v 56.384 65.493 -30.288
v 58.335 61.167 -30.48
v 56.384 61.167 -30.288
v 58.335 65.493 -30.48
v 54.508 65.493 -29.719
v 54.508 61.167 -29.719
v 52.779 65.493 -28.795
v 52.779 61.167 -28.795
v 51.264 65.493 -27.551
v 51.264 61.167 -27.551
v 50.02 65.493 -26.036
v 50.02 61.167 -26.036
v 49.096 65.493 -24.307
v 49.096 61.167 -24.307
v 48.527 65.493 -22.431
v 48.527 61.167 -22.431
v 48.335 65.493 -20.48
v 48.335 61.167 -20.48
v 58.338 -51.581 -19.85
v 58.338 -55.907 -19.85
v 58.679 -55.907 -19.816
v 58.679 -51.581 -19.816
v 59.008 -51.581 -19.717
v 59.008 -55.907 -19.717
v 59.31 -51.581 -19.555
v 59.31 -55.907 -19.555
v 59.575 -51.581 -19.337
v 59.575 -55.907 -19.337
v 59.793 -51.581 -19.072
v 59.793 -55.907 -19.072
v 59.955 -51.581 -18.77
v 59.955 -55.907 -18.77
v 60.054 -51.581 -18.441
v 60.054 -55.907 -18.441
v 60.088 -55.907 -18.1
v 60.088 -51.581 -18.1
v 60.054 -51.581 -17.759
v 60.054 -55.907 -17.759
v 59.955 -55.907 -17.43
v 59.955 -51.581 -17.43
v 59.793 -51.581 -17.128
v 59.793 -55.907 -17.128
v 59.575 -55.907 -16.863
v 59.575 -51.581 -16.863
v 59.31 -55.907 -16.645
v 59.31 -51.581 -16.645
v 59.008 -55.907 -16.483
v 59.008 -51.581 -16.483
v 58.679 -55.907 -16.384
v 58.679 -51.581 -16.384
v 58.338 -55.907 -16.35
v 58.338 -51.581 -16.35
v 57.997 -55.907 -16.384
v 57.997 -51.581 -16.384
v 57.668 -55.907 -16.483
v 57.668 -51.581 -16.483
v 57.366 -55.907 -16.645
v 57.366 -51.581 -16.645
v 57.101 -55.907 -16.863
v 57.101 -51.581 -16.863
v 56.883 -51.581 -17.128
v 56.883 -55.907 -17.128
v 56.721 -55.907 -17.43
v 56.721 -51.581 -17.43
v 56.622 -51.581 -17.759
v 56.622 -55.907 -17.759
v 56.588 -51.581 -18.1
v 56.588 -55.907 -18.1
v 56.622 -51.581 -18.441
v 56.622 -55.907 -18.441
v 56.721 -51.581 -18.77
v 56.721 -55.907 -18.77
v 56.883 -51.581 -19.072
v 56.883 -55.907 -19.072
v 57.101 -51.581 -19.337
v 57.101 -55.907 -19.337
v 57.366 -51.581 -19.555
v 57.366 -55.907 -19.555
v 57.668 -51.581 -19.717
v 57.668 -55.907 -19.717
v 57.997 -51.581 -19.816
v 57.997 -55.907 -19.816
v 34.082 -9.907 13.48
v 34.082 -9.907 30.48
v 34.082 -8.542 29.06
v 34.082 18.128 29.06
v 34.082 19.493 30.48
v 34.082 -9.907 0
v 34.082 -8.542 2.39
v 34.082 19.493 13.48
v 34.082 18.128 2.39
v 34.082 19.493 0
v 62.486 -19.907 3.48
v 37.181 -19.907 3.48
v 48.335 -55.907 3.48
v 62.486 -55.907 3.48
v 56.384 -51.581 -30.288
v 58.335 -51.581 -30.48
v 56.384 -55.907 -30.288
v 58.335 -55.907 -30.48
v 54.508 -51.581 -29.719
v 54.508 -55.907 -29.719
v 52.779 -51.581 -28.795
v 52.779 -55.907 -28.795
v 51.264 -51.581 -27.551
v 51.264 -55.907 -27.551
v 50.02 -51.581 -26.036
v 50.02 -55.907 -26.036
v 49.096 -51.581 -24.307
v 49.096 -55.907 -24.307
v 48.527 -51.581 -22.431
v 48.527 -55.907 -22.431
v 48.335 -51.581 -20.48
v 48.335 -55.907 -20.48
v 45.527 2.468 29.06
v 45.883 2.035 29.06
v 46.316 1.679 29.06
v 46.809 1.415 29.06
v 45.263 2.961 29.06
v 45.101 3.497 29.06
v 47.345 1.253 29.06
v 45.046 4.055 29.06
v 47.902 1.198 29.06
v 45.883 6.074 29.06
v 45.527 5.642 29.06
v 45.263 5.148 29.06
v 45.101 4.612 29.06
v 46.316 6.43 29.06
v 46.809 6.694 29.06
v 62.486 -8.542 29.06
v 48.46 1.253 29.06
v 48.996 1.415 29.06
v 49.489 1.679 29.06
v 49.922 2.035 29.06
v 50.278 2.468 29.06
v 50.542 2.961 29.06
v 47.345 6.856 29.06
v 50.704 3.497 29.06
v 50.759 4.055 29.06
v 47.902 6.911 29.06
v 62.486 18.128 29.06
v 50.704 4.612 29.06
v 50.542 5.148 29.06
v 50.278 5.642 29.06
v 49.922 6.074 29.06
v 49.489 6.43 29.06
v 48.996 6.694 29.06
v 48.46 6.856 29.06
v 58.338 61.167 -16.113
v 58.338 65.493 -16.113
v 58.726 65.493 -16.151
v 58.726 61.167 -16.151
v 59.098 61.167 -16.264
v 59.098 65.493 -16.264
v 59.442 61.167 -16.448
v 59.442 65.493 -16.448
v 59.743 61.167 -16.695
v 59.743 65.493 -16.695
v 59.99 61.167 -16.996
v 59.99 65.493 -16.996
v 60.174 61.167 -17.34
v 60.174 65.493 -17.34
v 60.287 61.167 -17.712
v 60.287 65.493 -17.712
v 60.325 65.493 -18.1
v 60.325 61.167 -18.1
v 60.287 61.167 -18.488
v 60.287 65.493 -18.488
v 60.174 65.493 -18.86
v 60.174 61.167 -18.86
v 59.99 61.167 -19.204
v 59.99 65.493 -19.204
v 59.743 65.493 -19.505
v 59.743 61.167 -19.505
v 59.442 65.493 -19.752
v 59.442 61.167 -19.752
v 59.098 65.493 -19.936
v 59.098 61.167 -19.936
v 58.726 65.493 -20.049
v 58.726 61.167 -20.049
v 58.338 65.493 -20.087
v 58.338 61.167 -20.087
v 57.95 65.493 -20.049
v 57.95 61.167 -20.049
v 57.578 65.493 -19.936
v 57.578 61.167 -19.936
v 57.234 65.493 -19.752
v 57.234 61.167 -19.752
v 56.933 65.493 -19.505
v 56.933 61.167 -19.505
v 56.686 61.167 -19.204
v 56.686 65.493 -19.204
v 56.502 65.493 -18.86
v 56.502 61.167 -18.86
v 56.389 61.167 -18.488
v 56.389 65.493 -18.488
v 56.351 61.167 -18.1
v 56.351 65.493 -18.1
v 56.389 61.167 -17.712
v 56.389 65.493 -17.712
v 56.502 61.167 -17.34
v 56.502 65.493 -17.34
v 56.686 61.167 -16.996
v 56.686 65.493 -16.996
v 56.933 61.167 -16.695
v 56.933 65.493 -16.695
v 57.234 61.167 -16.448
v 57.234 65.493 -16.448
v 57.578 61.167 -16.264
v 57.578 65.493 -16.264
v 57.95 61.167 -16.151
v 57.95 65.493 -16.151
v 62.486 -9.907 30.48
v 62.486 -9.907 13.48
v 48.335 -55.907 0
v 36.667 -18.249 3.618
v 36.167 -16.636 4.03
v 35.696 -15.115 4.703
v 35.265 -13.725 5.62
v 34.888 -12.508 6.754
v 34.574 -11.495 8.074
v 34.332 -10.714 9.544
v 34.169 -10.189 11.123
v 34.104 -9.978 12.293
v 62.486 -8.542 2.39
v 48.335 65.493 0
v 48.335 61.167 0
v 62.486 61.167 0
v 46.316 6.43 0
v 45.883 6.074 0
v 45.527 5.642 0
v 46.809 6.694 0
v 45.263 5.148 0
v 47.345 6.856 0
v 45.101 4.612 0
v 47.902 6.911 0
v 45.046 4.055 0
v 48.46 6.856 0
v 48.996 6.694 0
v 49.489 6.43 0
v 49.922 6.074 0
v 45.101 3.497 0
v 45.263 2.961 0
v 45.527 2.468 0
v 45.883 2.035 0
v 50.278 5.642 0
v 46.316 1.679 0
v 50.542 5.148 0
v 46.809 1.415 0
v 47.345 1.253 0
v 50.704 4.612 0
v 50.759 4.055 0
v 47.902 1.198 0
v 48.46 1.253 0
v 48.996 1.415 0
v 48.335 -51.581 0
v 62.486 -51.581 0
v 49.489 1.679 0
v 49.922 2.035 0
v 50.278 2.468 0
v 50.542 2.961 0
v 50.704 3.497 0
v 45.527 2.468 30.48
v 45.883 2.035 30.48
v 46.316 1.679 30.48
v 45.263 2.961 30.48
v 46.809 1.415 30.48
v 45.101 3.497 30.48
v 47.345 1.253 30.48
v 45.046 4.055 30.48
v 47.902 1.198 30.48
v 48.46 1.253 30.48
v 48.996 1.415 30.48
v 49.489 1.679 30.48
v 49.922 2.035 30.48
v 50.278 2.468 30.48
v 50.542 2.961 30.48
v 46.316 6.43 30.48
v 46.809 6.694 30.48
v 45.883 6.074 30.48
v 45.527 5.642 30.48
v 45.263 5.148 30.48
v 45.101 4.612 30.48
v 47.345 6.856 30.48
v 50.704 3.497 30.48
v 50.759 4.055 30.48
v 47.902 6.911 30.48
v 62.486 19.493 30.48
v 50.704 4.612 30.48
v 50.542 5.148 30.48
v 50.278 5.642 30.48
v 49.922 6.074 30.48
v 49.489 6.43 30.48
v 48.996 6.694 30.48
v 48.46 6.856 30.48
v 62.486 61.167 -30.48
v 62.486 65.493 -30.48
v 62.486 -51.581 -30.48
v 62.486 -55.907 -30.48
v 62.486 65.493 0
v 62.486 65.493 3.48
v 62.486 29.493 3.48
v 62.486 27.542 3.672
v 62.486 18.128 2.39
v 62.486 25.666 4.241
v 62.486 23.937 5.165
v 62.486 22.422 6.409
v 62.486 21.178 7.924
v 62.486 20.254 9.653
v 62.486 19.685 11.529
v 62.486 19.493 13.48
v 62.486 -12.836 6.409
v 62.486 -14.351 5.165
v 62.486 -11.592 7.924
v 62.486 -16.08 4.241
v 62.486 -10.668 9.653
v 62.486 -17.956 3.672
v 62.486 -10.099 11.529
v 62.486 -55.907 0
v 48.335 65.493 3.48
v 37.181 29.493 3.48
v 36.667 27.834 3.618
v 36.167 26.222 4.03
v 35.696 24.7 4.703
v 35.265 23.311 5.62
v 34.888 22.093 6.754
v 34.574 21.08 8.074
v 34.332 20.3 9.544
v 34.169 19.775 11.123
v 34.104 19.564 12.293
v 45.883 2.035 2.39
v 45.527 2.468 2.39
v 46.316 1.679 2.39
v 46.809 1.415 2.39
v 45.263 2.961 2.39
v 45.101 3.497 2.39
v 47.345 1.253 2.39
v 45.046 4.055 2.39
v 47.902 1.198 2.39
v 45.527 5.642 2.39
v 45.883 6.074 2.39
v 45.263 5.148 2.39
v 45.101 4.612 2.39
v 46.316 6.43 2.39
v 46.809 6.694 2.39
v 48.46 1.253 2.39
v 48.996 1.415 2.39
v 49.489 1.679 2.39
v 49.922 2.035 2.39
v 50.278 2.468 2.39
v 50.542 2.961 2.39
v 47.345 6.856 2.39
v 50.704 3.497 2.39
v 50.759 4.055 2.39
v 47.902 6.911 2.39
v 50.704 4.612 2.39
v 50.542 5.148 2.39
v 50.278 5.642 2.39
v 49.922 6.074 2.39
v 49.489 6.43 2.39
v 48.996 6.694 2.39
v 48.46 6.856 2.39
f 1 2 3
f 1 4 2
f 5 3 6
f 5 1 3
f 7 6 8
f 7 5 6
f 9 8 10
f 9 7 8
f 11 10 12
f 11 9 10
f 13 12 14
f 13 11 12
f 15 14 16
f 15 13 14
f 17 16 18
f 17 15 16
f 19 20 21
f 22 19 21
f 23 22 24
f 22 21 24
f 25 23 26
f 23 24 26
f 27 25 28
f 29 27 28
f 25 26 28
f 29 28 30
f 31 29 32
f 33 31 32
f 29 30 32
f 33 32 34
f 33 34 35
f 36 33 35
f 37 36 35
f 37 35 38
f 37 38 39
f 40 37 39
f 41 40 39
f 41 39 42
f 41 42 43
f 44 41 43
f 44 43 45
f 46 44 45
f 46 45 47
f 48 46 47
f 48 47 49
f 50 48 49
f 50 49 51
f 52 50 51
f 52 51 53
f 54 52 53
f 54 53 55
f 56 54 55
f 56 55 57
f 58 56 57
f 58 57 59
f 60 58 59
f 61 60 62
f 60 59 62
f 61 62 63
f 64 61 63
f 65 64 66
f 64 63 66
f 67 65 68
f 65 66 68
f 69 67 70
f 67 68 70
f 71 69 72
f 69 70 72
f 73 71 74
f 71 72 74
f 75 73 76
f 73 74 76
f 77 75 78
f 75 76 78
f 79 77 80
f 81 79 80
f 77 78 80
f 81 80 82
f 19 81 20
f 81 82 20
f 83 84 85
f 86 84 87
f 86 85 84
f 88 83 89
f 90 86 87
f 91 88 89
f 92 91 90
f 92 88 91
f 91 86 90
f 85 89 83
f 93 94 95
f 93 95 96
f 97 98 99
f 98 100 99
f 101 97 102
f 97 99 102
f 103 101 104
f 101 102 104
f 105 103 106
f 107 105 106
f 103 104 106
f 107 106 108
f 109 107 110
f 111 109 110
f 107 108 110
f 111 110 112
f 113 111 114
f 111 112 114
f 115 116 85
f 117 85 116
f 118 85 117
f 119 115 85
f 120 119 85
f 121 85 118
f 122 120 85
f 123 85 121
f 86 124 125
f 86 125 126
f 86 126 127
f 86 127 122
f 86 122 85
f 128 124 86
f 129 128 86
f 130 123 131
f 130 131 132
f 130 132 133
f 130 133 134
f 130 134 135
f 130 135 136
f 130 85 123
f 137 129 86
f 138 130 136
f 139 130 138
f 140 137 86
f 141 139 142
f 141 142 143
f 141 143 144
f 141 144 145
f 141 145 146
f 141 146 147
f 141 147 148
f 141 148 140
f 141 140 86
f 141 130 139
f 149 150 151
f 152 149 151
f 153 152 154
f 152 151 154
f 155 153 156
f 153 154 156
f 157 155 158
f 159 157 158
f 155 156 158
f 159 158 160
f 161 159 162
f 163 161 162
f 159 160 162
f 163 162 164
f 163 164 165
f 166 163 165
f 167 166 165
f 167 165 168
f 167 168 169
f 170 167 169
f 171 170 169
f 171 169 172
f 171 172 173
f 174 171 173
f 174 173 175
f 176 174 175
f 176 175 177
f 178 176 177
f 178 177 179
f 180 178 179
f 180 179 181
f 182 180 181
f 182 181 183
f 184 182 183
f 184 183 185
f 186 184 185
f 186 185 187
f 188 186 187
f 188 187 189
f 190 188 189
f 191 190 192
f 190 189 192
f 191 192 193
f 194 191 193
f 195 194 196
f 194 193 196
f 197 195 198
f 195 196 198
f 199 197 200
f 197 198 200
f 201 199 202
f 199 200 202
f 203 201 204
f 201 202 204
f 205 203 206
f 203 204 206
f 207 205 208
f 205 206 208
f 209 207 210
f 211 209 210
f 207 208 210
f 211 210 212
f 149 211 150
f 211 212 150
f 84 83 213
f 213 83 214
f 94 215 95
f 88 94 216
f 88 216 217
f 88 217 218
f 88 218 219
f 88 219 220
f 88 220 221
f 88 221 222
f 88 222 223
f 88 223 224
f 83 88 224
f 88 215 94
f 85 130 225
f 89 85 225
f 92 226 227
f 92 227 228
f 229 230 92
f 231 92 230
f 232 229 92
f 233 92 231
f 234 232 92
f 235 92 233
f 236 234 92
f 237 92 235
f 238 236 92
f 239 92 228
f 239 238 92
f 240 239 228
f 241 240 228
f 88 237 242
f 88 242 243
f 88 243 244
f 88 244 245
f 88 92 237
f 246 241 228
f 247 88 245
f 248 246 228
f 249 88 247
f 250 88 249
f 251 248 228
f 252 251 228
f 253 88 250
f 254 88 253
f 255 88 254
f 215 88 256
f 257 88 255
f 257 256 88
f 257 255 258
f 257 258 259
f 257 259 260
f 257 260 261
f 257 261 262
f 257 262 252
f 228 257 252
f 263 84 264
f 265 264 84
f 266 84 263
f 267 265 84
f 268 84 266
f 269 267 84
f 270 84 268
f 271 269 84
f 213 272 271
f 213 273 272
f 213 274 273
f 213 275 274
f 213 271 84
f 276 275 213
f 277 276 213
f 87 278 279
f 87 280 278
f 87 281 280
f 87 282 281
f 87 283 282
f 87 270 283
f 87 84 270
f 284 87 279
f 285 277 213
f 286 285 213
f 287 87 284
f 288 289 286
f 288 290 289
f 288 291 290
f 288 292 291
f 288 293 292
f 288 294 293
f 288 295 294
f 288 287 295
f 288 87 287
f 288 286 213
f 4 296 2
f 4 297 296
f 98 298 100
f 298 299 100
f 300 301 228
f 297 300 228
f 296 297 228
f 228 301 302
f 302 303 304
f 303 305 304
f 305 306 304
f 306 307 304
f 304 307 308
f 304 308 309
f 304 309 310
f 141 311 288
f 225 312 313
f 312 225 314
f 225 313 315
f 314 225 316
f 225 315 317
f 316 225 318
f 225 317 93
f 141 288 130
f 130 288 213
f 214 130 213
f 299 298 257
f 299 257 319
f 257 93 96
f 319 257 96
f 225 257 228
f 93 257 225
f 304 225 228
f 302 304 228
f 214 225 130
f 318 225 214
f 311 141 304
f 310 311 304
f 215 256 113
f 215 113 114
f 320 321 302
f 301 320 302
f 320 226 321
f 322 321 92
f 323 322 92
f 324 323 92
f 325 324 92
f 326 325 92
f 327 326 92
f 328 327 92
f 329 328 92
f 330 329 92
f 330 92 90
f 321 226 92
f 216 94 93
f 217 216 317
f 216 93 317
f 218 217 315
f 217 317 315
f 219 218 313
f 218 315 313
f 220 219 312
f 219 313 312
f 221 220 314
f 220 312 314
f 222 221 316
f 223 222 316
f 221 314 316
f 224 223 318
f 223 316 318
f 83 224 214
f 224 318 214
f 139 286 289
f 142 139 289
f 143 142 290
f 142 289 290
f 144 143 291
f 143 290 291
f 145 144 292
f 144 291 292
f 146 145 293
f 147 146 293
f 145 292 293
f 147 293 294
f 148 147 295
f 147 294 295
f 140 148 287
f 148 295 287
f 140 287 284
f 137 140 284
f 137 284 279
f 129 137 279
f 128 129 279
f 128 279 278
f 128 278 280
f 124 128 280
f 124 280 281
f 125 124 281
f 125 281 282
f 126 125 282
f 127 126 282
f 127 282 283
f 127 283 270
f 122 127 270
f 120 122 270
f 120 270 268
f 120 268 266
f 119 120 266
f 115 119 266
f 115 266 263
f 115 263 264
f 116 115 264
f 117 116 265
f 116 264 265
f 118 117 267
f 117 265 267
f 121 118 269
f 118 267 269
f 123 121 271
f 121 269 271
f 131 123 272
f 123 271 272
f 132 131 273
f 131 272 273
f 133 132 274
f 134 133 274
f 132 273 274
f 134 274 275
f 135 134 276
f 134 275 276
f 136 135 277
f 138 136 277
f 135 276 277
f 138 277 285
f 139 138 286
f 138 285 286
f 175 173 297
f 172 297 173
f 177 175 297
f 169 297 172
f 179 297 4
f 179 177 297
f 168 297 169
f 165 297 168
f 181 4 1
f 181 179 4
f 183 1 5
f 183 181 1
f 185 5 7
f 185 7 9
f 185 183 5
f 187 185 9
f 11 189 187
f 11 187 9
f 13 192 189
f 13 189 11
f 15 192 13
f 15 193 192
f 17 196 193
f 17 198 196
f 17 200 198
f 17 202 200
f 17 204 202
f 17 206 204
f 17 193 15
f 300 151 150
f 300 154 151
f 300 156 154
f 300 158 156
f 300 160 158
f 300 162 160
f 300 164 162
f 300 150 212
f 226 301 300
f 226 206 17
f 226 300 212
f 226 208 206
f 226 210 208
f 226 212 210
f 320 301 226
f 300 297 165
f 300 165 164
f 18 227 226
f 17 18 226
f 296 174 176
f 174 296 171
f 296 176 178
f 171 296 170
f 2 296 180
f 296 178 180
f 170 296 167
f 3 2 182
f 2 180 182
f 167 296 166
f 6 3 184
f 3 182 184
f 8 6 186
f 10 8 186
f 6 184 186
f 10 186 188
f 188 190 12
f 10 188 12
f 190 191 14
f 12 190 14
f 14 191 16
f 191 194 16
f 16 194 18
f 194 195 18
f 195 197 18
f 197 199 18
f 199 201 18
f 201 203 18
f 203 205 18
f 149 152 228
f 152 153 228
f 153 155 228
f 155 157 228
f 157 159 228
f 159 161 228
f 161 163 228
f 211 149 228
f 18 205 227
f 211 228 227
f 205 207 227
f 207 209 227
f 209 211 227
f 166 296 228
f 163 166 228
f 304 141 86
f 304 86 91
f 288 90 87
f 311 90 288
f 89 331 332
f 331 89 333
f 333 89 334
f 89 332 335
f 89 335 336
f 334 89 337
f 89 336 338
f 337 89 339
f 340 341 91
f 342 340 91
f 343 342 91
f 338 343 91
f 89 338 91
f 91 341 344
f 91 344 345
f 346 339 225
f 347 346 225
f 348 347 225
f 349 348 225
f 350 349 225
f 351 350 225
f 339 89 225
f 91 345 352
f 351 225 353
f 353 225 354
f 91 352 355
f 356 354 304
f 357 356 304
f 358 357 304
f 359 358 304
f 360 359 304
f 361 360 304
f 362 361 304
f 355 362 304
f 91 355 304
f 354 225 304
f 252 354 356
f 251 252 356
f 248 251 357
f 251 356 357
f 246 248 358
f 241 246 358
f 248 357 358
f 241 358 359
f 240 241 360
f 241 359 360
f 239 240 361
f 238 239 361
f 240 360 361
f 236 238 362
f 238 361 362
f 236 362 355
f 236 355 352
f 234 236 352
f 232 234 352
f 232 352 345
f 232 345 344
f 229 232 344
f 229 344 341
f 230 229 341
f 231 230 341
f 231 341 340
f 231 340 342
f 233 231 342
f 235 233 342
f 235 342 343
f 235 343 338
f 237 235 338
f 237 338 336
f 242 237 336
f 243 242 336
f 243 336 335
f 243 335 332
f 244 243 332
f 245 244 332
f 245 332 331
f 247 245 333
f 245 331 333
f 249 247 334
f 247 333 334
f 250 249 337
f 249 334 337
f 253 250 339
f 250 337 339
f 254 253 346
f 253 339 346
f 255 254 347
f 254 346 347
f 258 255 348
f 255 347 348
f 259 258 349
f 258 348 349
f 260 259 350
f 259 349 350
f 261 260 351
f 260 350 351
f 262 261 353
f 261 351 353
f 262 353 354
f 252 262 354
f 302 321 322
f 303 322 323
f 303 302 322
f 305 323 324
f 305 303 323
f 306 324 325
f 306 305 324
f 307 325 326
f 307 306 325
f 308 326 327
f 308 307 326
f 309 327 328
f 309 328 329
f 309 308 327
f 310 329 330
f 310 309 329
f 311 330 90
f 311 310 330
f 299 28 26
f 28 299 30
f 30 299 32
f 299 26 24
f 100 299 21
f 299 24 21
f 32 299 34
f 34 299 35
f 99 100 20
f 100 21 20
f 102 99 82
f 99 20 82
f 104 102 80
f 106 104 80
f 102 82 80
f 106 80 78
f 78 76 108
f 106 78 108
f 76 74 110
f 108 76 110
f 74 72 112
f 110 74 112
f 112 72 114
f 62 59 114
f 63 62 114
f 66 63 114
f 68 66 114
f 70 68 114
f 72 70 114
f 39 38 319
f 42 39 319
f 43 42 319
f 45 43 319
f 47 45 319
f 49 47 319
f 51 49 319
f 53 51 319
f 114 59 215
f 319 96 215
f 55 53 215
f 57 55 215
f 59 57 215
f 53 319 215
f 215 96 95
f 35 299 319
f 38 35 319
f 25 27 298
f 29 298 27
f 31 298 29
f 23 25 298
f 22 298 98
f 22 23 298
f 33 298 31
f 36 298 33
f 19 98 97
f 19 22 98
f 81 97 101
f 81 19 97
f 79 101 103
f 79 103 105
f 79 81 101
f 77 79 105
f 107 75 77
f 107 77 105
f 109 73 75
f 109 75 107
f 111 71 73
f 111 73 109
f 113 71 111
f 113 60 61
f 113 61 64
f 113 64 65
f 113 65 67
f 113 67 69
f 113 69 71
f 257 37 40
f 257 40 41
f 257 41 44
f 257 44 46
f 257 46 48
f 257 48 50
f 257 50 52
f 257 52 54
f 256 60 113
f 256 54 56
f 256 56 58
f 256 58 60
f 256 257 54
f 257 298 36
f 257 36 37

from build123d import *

# Parameters (mm, degrees)
SKETCH2_W           = 28.40399364
SKETCH2_H           = 29.4
BOSS_EXTRUDE1_DEPTH = 30.48
BOSS_EXTRUDE2_DEPTH = 3.48
SKETCH7_W           = 14.151447967
SKETCH7_H           = 4.326095682
BOSS_EXTRUDE3_DEPTH = 30.48
SKETCH8_R           = 1.986850399
CUT_EXTRUDE3_DEPTH  = 4.48
FILLET2_R           = 10
SKETCH4_R           = 2.85648699
CUT_EXTRUDE2_DEPTH  = 30.48
FILLET3_R           = 10
SKETCH9_R           = 1.75
CUT_EXTRUDE4_DEPTH  = 4.48
SKETCH3_W           = 26.67
SKETCH3_H           = 26.67
CUT_EXTRUDE1_DEPTH  = 30.48
FILLET4_R           = 10


with BuildPart() as part:
    # Sketch2 → Boss-Extrude1 (new body)
    with BuildSketch(Plane.XY):
        with Locations((48.284161423, 4.792820272)):
            Rectangle(SKETCH2_W, SKETCH2_H)
    boss_extrude1 = extrude(amount=BOSS_EXTRUDE1_DEPTH)

    # Sketch5 → Boss-Extrude2 (add)
    with BuildSketch(Plane(origin=(0, 0, 0), x_dir=(-1, 0, 0), z_dir=(0, 0, -1))):
        Polygon((-62.486158243, 19.492820272), (-62.486158243, 65.492820272), (-48.334710276, 65.492820272), (-34.082164603, 19.492820272), align=None)
    boss_extrude2 = extrude(amount=-BOSS_EXTRUDE2_DEPTH)

    # Sketch7 → Boss-Extrude3 (add)
    with BuildSketch(Plane(origin=(0, 0, 0), x_dir=(-1, 0, 0), z_dir=(0, 0, -1))):
        with Locations((-55.41043426, 63.329772431)):
            Rectangle(SKETCH7_W, SKETCH7_H)
    boss_extrude3 = extrude(amount=BOSS_EXTRUDE3_DEPTH)

    # Sketch8 → Cut-Extrude3 (cut)
    with BuildSketch(Plane(origin=(0, 65.492820272, 0), x_dir=(1, 0, 0), z_dir=(0, 1, 0))):
        with Locations((58.338019211, 18.1)):
            Circle(SKETCH8_R)
    extrude(amount=-CUT_EXTRUDE3_DEPTH, mode=Mode.SUBTRACT)

    # Fillet2
    fillet2_edges = [part.edges().sort_by_distance(p)[0] for p in [
        (48.284161423, 19.492820272, 3.48),
    ]]
    fillet(fillet2_edges, radius=FILLET2_R)

    # Mirror3: Boss-Extrude1, Boss-Extrude2, Boss-Extrude3 across plane
    add(boss_extrude1.mirror(Plane(origin=(0, 4.792820272, 0), x_dir=(0, 0, 1), z_dir=(0, -1, 0))))
    add(boss_extrude2.mirror(Plane(origin=(0, 4.792820272, 0), x_dir=(0, 0, 1), z_dir=(0, -1, 0))))
    add(boss_extrude3.mirror(Plane(origin=(0, 4.792820272, 0), x_dir=(0, 0, 1), z_dir=(0, -1, 0))))

    # Sketch4 → Cut-Extrude2 (cut)
    with BuildSketch(Plane.XY.offset(30.48)):
        with Locations((47.902483521, 4.05454278)):
            Circle(SKETCH4_R)
    extrude(amount=-CUT_EXTRUDE2_DEPTH, mode=Mode.SUBTRACT)

    # Fillet3
    fillet3_edges = [part.edges().sort_by_distance(p)[0] for p in [
        (48.284161423, -9.907179728, 3.48),
    ]]
    fillet(fillet3_edges, radius=FILLET3_R)

    # Sketch9 → Cut-Extrude4 (cut)
    with BuildSketch(Plane.XZ.offset(55.907179728)):
        with Locations((58.338019211, -18.1)):
            Circle(SKETCH9_R)
    extrude(amount=-CUT_EXTRUDE4_DEPTH, mode=Mode.SUBTRACT)

    # Sketch3 → Cut-Extrude1 (cut)
    with BuildSketch(Plane(origin=(62.486158243, 0, 0), x_dir=(0, 0, -1), z_dir=(1, 0, 0))):
        with Locations((-15.72499675, 4.792820272)):
            Rectangle(SKETCH3_W, SKETCH3_H)
    extrude(amount=-CUT_EXTRUDE1_DEPTH, mode=Mode.SUBTRACT)

    # Fillet4
    fillet4_edges = [part.edges().sort_by_distance(p)[0] for p in [
        (48.334710276, 63.329772431, -30.48),
        (48.334710276, -53.744131887, -30.48),
    ]]
    fillet(fillet4_edges, radius=FILLET4_R)


solid = part.part
